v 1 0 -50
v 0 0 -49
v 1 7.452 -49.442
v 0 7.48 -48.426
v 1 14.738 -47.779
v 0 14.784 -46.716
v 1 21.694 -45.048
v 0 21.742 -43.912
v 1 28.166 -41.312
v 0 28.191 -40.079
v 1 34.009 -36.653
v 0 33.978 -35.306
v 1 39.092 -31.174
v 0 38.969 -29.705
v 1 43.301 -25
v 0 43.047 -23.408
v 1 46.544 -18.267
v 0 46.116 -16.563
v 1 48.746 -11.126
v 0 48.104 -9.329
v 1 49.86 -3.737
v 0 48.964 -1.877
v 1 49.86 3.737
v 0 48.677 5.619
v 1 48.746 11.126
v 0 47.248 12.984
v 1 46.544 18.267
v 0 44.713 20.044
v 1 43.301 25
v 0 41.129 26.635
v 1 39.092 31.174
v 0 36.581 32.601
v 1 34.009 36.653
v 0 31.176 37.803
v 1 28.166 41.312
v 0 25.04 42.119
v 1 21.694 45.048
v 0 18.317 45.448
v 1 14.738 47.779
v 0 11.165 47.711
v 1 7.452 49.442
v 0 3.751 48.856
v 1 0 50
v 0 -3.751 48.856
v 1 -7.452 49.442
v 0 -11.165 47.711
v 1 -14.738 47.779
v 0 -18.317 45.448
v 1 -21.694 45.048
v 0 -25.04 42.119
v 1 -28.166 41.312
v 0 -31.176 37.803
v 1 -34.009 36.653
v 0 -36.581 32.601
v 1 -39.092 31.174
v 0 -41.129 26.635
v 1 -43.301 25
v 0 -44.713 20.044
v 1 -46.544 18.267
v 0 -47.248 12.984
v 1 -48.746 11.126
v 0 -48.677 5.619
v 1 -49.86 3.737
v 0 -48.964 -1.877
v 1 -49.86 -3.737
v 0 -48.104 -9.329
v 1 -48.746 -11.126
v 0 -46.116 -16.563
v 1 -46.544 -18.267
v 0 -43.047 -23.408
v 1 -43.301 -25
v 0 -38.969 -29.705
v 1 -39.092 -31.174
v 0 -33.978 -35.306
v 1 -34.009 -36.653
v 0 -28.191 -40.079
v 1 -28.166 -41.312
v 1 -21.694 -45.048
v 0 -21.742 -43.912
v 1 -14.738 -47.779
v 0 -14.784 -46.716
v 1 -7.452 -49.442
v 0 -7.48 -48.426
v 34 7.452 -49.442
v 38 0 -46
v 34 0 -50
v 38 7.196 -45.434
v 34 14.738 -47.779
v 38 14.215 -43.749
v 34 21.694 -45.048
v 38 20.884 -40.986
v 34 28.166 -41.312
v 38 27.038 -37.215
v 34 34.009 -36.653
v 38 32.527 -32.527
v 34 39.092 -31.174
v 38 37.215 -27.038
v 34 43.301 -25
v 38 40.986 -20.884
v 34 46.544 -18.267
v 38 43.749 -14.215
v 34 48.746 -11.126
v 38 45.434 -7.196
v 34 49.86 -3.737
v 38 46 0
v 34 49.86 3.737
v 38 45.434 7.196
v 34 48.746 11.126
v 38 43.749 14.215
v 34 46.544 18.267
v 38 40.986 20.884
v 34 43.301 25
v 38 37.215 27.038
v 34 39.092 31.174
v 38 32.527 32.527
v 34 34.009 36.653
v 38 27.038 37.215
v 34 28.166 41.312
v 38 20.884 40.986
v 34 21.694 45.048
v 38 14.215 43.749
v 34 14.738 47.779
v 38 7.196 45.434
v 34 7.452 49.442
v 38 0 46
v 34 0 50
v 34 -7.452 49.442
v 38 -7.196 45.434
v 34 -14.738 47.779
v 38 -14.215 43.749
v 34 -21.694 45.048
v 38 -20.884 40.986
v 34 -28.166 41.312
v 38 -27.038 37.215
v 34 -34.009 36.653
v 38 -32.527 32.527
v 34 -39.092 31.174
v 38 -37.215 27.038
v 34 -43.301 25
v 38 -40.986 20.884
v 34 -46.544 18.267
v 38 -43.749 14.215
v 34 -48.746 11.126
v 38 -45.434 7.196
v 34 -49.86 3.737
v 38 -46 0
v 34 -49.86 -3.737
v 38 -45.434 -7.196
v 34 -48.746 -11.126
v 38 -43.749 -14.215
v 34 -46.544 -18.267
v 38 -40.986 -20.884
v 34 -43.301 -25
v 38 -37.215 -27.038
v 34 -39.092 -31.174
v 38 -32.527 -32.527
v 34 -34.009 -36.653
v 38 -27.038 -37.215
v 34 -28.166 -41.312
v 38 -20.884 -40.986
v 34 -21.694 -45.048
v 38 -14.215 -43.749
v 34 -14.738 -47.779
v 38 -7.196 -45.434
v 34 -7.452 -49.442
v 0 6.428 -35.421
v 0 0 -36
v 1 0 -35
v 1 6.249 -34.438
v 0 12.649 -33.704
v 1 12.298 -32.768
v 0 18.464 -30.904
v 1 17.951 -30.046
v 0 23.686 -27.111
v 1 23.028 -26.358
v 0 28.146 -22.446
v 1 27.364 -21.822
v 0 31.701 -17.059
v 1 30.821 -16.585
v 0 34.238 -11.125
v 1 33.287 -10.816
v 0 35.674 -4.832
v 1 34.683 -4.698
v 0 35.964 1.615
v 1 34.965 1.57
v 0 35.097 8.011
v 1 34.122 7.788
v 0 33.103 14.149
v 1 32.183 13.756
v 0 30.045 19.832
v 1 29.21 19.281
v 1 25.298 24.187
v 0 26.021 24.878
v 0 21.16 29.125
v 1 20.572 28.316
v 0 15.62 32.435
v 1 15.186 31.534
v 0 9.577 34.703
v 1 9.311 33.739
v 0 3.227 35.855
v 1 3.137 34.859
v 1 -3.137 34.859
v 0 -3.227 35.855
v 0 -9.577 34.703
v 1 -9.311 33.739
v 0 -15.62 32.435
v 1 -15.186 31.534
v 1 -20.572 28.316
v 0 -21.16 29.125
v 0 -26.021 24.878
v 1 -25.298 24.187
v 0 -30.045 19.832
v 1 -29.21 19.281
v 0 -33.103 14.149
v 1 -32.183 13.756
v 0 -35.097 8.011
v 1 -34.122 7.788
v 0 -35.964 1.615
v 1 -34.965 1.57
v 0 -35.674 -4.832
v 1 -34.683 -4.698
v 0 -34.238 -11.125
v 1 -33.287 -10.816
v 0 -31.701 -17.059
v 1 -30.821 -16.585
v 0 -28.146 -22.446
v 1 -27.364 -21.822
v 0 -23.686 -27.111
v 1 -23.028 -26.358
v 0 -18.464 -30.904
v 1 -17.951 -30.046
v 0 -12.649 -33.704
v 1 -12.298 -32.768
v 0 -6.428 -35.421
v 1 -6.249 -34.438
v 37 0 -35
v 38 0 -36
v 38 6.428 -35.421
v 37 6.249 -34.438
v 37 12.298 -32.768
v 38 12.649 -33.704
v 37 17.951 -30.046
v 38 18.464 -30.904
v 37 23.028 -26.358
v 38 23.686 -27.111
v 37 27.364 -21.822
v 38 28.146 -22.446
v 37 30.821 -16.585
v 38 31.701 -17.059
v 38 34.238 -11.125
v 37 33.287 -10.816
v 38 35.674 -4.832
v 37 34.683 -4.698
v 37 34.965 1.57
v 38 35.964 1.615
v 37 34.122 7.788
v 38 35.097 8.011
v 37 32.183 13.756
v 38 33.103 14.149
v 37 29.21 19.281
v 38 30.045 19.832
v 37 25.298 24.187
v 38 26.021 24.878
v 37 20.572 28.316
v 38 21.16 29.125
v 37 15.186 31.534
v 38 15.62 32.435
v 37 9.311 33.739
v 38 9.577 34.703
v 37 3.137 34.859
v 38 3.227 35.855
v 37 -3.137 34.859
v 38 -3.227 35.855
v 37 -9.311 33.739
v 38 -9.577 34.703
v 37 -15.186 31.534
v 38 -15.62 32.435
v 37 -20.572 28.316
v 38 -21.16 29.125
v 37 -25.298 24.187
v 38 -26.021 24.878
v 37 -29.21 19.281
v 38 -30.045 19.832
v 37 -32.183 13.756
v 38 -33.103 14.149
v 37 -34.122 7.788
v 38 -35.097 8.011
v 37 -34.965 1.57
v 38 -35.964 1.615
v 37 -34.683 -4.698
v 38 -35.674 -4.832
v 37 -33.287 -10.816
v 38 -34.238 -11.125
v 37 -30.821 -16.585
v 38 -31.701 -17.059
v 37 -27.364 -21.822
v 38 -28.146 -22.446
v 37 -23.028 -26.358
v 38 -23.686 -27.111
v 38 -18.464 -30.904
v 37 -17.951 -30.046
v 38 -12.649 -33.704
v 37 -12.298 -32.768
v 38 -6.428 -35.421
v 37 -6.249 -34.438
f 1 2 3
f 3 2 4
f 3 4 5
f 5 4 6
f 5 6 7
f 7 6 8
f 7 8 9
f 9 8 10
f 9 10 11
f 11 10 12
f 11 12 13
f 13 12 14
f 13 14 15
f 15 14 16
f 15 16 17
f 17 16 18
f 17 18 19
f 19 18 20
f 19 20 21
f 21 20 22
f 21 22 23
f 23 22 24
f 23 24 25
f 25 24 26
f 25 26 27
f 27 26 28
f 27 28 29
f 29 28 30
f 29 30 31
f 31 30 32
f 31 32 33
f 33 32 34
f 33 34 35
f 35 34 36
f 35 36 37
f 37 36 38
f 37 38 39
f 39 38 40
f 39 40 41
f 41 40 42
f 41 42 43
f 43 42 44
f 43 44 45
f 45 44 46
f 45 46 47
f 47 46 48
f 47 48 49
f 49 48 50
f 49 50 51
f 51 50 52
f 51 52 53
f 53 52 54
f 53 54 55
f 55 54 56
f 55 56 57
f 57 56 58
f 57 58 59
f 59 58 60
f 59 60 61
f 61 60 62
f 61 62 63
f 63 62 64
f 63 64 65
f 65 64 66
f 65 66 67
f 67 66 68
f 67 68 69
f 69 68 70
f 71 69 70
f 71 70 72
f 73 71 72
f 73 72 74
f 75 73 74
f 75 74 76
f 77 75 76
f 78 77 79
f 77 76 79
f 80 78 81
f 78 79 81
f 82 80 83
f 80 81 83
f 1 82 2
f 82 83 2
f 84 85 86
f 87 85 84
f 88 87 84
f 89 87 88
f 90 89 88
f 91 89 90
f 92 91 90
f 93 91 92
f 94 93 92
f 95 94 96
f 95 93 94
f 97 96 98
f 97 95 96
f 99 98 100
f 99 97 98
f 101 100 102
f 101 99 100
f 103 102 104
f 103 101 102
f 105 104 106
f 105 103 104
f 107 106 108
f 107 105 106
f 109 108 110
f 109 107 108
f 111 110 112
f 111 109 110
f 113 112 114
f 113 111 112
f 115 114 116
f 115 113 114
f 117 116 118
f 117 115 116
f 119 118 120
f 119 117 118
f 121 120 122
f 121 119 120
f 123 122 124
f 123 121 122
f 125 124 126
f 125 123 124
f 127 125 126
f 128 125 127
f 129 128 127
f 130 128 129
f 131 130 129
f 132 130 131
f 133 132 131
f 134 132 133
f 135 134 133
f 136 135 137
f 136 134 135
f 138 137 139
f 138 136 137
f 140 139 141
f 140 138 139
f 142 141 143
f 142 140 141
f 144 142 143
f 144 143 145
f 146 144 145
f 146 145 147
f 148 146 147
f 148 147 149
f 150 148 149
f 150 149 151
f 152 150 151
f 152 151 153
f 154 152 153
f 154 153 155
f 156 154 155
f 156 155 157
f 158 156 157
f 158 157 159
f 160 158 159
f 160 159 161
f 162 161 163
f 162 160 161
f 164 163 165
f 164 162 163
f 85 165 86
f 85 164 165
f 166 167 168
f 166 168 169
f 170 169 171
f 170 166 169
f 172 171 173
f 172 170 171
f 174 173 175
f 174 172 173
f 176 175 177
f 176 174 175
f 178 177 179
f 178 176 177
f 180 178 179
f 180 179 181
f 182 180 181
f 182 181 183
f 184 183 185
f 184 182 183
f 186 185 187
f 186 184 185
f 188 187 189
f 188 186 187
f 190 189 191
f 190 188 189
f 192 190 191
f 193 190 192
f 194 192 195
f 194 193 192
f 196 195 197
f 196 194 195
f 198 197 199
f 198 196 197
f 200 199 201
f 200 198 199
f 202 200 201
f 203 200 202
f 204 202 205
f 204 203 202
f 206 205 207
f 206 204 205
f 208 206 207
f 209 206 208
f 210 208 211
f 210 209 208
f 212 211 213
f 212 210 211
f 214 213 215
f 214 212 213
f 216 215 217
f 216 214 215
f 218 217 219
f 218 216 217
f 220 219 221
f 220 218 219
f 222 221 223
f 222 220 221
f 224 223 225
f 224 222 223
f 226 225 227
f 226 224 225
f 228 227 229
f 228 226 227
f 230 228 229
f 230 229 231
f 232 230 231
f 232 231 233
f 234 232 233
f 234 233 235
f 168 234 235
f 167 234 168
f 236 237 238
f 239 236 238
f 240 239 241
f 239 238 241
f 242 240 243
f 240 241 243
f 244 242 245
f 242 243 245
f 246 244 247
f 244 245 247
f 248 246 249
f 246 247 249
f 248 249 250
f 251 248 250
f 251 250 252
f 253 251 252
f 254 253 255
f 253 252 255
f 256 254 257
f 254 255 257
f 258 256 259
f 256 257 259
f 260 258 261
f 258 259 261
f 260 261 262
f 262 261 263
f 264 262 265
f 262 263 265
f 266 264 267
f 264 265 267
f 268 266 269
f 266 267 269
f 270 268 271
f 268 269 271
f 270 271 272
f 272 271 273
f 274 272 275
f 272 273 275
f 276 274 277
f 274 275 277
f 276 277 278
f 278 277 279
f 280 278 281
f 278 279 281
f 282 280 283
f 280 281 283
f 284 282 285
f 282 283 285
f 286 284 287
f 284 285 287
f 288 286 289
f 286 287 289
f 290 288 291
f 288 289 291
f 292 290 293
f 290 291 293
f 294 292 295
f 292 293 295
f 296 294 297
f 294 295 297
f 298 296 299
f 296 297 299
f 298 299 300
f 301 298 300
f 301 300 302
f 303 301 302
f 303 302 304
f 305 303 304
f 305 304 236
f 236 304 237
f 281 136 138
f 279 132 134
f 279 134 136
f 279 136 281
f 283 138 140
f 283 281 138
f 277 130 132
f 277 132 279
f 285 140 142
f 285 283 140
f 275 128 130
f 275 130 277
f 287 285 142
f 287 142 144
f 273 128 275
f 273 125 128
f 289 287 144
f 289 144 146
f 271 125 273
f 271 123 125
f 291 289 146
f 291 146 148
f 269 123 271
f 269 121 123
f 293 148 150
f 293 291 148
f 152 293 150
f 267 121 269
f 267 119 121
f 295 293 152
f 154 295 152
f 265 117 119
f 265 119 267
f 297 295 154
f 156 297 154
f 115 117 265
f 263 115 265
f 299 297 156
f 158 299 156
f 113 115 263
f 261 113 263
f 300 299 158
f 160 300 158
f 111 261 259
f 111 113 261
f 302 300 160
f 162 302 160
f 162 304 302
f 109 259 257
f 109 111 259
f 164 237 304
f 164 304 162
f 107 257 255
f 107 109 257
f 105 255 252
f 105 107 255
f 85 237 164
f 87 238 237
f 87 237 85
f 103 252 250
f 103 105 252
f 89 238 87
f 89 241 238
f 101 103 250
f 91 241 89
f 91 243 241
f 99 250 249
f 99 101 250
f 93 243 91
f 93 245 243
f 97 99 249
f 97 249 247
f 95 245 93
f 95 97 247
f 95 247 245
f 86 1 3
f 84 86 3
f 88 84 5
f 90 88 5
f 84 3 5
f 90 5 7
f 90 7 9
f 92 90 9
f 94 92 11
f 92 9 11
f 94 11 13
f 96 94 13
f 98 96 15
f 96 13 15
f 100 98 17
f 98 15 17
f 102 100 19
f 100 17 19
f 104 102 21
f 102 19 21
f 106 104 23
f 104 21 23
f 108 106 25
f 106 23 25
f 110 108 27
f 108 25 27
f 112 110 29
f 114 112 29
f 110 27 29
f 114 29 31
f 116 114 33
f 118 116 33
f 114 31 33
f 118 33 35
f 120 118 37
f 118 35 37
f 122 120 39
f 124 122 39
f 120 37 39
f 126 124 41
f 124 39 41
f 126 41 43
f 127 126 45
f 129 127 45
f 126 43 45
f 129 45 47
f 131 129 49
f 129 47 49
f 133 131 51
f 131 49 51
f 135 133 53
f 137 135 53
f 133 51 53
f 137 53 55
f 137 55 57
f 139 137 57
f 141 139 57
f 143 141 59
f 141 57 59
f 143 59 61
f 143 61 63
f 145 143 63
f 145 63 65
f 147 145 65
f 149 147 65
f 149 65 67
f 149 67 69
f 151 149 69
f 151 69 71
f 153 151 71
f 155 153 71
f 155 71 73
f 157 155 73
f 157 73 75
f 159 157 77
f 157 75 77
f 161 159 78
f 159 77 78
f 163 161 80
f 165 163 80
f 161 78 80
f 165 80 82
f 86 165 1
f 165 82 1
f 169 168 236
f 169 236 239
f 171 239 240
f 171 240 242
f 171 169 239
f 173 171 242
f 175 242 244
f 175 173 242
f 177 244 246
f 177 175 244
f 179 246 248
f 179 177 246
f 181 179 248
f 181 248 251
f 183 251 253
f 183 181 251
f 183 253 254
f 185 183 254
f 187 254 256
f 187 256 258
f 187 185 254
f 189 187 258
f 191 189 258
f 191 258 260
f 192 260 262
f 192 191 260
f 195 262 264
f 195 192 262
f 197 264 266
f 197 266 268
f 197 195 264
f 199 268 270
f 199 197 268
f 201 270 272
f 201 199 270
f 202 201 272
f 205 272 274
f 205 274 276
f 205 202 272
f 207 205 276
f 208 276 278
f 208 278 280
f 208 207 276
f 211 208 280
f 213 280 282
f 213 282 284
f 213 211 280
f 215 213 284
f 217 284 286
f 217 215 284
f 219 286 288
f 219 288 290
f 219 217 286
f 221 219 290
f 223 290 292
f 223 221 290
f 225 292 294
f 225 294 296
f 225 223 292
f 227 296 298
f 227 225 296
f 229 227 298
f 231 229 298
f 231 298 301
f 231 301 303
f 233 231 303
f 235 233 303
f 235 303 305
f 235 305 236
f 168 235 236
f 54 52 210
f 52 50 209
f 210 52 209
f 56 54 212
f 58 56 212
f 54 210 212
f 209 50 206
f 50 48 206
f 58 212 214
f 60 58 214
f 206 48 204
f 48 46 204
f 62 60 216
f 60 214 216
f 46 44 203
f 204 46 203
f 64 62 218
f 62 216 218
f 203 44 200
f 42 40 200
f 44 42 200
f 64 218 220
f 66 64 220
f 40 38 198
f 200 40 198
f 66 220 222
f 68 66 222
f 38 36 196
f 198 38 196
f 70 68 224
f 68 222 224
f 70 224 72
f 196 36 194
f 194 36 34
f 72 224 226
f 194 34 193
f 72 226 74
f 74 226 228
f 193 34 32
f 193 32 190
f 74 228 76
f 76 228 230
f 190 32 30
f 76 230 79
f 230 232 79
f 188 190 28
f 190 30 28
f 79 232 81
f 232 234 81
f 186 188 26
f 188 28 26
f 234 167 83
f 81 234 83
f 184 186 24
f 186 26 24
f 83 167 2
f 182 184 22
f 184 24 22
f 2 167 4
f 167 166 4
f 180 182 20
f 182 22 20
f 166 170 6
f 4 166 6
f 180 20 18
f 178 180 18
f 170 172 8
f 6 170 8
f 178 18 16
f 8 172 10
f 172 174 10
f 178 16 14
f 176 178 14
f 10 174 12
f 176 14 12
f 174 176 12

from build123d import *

# Parameters (mm, degrees)
SKETCH_1_R      = 50
SKETCH_1_R_2    = 35
EXTRUDE_1_DEPTH = 38
CHAMFER_1_SIZE  = 1
CHAMFER_2_SIZE  = 4


with BuildPart() as part:
    # 草图1 → 凸台-拉伸1 (new body)
    with BuildSketch(Plane(origin=(0, 0, 0), x_dir=(0, 0, -1), z_dir=(1, 0, 0))):
        Circle(SKETCH_1_R)
        Circle(SKETCH_1_R_2, mode=Mode.SUBTRACT)
    extrude(amount=EXTRUDE_1_DEPTH)

    # 倒角1
    chamfer_1_edges = [part.edges().sort_by_distance(p)[0] for p in [
        (0, 0, 50),
        (0, 0, 35),
        (38, 0, 35),
    ]]
    chamfer(chamfer_1_edges, length=CHAMFER_1_SIZE)

    # 倒角2
    chamfer_2_edges = [part.edges().sort_by_distance(p)[0] for p in [
        (38, 0, 50),
    ]]
    chamfer(chamfer_2_edges, length=CHAMFER_2_SIZE)


solid = part.part
